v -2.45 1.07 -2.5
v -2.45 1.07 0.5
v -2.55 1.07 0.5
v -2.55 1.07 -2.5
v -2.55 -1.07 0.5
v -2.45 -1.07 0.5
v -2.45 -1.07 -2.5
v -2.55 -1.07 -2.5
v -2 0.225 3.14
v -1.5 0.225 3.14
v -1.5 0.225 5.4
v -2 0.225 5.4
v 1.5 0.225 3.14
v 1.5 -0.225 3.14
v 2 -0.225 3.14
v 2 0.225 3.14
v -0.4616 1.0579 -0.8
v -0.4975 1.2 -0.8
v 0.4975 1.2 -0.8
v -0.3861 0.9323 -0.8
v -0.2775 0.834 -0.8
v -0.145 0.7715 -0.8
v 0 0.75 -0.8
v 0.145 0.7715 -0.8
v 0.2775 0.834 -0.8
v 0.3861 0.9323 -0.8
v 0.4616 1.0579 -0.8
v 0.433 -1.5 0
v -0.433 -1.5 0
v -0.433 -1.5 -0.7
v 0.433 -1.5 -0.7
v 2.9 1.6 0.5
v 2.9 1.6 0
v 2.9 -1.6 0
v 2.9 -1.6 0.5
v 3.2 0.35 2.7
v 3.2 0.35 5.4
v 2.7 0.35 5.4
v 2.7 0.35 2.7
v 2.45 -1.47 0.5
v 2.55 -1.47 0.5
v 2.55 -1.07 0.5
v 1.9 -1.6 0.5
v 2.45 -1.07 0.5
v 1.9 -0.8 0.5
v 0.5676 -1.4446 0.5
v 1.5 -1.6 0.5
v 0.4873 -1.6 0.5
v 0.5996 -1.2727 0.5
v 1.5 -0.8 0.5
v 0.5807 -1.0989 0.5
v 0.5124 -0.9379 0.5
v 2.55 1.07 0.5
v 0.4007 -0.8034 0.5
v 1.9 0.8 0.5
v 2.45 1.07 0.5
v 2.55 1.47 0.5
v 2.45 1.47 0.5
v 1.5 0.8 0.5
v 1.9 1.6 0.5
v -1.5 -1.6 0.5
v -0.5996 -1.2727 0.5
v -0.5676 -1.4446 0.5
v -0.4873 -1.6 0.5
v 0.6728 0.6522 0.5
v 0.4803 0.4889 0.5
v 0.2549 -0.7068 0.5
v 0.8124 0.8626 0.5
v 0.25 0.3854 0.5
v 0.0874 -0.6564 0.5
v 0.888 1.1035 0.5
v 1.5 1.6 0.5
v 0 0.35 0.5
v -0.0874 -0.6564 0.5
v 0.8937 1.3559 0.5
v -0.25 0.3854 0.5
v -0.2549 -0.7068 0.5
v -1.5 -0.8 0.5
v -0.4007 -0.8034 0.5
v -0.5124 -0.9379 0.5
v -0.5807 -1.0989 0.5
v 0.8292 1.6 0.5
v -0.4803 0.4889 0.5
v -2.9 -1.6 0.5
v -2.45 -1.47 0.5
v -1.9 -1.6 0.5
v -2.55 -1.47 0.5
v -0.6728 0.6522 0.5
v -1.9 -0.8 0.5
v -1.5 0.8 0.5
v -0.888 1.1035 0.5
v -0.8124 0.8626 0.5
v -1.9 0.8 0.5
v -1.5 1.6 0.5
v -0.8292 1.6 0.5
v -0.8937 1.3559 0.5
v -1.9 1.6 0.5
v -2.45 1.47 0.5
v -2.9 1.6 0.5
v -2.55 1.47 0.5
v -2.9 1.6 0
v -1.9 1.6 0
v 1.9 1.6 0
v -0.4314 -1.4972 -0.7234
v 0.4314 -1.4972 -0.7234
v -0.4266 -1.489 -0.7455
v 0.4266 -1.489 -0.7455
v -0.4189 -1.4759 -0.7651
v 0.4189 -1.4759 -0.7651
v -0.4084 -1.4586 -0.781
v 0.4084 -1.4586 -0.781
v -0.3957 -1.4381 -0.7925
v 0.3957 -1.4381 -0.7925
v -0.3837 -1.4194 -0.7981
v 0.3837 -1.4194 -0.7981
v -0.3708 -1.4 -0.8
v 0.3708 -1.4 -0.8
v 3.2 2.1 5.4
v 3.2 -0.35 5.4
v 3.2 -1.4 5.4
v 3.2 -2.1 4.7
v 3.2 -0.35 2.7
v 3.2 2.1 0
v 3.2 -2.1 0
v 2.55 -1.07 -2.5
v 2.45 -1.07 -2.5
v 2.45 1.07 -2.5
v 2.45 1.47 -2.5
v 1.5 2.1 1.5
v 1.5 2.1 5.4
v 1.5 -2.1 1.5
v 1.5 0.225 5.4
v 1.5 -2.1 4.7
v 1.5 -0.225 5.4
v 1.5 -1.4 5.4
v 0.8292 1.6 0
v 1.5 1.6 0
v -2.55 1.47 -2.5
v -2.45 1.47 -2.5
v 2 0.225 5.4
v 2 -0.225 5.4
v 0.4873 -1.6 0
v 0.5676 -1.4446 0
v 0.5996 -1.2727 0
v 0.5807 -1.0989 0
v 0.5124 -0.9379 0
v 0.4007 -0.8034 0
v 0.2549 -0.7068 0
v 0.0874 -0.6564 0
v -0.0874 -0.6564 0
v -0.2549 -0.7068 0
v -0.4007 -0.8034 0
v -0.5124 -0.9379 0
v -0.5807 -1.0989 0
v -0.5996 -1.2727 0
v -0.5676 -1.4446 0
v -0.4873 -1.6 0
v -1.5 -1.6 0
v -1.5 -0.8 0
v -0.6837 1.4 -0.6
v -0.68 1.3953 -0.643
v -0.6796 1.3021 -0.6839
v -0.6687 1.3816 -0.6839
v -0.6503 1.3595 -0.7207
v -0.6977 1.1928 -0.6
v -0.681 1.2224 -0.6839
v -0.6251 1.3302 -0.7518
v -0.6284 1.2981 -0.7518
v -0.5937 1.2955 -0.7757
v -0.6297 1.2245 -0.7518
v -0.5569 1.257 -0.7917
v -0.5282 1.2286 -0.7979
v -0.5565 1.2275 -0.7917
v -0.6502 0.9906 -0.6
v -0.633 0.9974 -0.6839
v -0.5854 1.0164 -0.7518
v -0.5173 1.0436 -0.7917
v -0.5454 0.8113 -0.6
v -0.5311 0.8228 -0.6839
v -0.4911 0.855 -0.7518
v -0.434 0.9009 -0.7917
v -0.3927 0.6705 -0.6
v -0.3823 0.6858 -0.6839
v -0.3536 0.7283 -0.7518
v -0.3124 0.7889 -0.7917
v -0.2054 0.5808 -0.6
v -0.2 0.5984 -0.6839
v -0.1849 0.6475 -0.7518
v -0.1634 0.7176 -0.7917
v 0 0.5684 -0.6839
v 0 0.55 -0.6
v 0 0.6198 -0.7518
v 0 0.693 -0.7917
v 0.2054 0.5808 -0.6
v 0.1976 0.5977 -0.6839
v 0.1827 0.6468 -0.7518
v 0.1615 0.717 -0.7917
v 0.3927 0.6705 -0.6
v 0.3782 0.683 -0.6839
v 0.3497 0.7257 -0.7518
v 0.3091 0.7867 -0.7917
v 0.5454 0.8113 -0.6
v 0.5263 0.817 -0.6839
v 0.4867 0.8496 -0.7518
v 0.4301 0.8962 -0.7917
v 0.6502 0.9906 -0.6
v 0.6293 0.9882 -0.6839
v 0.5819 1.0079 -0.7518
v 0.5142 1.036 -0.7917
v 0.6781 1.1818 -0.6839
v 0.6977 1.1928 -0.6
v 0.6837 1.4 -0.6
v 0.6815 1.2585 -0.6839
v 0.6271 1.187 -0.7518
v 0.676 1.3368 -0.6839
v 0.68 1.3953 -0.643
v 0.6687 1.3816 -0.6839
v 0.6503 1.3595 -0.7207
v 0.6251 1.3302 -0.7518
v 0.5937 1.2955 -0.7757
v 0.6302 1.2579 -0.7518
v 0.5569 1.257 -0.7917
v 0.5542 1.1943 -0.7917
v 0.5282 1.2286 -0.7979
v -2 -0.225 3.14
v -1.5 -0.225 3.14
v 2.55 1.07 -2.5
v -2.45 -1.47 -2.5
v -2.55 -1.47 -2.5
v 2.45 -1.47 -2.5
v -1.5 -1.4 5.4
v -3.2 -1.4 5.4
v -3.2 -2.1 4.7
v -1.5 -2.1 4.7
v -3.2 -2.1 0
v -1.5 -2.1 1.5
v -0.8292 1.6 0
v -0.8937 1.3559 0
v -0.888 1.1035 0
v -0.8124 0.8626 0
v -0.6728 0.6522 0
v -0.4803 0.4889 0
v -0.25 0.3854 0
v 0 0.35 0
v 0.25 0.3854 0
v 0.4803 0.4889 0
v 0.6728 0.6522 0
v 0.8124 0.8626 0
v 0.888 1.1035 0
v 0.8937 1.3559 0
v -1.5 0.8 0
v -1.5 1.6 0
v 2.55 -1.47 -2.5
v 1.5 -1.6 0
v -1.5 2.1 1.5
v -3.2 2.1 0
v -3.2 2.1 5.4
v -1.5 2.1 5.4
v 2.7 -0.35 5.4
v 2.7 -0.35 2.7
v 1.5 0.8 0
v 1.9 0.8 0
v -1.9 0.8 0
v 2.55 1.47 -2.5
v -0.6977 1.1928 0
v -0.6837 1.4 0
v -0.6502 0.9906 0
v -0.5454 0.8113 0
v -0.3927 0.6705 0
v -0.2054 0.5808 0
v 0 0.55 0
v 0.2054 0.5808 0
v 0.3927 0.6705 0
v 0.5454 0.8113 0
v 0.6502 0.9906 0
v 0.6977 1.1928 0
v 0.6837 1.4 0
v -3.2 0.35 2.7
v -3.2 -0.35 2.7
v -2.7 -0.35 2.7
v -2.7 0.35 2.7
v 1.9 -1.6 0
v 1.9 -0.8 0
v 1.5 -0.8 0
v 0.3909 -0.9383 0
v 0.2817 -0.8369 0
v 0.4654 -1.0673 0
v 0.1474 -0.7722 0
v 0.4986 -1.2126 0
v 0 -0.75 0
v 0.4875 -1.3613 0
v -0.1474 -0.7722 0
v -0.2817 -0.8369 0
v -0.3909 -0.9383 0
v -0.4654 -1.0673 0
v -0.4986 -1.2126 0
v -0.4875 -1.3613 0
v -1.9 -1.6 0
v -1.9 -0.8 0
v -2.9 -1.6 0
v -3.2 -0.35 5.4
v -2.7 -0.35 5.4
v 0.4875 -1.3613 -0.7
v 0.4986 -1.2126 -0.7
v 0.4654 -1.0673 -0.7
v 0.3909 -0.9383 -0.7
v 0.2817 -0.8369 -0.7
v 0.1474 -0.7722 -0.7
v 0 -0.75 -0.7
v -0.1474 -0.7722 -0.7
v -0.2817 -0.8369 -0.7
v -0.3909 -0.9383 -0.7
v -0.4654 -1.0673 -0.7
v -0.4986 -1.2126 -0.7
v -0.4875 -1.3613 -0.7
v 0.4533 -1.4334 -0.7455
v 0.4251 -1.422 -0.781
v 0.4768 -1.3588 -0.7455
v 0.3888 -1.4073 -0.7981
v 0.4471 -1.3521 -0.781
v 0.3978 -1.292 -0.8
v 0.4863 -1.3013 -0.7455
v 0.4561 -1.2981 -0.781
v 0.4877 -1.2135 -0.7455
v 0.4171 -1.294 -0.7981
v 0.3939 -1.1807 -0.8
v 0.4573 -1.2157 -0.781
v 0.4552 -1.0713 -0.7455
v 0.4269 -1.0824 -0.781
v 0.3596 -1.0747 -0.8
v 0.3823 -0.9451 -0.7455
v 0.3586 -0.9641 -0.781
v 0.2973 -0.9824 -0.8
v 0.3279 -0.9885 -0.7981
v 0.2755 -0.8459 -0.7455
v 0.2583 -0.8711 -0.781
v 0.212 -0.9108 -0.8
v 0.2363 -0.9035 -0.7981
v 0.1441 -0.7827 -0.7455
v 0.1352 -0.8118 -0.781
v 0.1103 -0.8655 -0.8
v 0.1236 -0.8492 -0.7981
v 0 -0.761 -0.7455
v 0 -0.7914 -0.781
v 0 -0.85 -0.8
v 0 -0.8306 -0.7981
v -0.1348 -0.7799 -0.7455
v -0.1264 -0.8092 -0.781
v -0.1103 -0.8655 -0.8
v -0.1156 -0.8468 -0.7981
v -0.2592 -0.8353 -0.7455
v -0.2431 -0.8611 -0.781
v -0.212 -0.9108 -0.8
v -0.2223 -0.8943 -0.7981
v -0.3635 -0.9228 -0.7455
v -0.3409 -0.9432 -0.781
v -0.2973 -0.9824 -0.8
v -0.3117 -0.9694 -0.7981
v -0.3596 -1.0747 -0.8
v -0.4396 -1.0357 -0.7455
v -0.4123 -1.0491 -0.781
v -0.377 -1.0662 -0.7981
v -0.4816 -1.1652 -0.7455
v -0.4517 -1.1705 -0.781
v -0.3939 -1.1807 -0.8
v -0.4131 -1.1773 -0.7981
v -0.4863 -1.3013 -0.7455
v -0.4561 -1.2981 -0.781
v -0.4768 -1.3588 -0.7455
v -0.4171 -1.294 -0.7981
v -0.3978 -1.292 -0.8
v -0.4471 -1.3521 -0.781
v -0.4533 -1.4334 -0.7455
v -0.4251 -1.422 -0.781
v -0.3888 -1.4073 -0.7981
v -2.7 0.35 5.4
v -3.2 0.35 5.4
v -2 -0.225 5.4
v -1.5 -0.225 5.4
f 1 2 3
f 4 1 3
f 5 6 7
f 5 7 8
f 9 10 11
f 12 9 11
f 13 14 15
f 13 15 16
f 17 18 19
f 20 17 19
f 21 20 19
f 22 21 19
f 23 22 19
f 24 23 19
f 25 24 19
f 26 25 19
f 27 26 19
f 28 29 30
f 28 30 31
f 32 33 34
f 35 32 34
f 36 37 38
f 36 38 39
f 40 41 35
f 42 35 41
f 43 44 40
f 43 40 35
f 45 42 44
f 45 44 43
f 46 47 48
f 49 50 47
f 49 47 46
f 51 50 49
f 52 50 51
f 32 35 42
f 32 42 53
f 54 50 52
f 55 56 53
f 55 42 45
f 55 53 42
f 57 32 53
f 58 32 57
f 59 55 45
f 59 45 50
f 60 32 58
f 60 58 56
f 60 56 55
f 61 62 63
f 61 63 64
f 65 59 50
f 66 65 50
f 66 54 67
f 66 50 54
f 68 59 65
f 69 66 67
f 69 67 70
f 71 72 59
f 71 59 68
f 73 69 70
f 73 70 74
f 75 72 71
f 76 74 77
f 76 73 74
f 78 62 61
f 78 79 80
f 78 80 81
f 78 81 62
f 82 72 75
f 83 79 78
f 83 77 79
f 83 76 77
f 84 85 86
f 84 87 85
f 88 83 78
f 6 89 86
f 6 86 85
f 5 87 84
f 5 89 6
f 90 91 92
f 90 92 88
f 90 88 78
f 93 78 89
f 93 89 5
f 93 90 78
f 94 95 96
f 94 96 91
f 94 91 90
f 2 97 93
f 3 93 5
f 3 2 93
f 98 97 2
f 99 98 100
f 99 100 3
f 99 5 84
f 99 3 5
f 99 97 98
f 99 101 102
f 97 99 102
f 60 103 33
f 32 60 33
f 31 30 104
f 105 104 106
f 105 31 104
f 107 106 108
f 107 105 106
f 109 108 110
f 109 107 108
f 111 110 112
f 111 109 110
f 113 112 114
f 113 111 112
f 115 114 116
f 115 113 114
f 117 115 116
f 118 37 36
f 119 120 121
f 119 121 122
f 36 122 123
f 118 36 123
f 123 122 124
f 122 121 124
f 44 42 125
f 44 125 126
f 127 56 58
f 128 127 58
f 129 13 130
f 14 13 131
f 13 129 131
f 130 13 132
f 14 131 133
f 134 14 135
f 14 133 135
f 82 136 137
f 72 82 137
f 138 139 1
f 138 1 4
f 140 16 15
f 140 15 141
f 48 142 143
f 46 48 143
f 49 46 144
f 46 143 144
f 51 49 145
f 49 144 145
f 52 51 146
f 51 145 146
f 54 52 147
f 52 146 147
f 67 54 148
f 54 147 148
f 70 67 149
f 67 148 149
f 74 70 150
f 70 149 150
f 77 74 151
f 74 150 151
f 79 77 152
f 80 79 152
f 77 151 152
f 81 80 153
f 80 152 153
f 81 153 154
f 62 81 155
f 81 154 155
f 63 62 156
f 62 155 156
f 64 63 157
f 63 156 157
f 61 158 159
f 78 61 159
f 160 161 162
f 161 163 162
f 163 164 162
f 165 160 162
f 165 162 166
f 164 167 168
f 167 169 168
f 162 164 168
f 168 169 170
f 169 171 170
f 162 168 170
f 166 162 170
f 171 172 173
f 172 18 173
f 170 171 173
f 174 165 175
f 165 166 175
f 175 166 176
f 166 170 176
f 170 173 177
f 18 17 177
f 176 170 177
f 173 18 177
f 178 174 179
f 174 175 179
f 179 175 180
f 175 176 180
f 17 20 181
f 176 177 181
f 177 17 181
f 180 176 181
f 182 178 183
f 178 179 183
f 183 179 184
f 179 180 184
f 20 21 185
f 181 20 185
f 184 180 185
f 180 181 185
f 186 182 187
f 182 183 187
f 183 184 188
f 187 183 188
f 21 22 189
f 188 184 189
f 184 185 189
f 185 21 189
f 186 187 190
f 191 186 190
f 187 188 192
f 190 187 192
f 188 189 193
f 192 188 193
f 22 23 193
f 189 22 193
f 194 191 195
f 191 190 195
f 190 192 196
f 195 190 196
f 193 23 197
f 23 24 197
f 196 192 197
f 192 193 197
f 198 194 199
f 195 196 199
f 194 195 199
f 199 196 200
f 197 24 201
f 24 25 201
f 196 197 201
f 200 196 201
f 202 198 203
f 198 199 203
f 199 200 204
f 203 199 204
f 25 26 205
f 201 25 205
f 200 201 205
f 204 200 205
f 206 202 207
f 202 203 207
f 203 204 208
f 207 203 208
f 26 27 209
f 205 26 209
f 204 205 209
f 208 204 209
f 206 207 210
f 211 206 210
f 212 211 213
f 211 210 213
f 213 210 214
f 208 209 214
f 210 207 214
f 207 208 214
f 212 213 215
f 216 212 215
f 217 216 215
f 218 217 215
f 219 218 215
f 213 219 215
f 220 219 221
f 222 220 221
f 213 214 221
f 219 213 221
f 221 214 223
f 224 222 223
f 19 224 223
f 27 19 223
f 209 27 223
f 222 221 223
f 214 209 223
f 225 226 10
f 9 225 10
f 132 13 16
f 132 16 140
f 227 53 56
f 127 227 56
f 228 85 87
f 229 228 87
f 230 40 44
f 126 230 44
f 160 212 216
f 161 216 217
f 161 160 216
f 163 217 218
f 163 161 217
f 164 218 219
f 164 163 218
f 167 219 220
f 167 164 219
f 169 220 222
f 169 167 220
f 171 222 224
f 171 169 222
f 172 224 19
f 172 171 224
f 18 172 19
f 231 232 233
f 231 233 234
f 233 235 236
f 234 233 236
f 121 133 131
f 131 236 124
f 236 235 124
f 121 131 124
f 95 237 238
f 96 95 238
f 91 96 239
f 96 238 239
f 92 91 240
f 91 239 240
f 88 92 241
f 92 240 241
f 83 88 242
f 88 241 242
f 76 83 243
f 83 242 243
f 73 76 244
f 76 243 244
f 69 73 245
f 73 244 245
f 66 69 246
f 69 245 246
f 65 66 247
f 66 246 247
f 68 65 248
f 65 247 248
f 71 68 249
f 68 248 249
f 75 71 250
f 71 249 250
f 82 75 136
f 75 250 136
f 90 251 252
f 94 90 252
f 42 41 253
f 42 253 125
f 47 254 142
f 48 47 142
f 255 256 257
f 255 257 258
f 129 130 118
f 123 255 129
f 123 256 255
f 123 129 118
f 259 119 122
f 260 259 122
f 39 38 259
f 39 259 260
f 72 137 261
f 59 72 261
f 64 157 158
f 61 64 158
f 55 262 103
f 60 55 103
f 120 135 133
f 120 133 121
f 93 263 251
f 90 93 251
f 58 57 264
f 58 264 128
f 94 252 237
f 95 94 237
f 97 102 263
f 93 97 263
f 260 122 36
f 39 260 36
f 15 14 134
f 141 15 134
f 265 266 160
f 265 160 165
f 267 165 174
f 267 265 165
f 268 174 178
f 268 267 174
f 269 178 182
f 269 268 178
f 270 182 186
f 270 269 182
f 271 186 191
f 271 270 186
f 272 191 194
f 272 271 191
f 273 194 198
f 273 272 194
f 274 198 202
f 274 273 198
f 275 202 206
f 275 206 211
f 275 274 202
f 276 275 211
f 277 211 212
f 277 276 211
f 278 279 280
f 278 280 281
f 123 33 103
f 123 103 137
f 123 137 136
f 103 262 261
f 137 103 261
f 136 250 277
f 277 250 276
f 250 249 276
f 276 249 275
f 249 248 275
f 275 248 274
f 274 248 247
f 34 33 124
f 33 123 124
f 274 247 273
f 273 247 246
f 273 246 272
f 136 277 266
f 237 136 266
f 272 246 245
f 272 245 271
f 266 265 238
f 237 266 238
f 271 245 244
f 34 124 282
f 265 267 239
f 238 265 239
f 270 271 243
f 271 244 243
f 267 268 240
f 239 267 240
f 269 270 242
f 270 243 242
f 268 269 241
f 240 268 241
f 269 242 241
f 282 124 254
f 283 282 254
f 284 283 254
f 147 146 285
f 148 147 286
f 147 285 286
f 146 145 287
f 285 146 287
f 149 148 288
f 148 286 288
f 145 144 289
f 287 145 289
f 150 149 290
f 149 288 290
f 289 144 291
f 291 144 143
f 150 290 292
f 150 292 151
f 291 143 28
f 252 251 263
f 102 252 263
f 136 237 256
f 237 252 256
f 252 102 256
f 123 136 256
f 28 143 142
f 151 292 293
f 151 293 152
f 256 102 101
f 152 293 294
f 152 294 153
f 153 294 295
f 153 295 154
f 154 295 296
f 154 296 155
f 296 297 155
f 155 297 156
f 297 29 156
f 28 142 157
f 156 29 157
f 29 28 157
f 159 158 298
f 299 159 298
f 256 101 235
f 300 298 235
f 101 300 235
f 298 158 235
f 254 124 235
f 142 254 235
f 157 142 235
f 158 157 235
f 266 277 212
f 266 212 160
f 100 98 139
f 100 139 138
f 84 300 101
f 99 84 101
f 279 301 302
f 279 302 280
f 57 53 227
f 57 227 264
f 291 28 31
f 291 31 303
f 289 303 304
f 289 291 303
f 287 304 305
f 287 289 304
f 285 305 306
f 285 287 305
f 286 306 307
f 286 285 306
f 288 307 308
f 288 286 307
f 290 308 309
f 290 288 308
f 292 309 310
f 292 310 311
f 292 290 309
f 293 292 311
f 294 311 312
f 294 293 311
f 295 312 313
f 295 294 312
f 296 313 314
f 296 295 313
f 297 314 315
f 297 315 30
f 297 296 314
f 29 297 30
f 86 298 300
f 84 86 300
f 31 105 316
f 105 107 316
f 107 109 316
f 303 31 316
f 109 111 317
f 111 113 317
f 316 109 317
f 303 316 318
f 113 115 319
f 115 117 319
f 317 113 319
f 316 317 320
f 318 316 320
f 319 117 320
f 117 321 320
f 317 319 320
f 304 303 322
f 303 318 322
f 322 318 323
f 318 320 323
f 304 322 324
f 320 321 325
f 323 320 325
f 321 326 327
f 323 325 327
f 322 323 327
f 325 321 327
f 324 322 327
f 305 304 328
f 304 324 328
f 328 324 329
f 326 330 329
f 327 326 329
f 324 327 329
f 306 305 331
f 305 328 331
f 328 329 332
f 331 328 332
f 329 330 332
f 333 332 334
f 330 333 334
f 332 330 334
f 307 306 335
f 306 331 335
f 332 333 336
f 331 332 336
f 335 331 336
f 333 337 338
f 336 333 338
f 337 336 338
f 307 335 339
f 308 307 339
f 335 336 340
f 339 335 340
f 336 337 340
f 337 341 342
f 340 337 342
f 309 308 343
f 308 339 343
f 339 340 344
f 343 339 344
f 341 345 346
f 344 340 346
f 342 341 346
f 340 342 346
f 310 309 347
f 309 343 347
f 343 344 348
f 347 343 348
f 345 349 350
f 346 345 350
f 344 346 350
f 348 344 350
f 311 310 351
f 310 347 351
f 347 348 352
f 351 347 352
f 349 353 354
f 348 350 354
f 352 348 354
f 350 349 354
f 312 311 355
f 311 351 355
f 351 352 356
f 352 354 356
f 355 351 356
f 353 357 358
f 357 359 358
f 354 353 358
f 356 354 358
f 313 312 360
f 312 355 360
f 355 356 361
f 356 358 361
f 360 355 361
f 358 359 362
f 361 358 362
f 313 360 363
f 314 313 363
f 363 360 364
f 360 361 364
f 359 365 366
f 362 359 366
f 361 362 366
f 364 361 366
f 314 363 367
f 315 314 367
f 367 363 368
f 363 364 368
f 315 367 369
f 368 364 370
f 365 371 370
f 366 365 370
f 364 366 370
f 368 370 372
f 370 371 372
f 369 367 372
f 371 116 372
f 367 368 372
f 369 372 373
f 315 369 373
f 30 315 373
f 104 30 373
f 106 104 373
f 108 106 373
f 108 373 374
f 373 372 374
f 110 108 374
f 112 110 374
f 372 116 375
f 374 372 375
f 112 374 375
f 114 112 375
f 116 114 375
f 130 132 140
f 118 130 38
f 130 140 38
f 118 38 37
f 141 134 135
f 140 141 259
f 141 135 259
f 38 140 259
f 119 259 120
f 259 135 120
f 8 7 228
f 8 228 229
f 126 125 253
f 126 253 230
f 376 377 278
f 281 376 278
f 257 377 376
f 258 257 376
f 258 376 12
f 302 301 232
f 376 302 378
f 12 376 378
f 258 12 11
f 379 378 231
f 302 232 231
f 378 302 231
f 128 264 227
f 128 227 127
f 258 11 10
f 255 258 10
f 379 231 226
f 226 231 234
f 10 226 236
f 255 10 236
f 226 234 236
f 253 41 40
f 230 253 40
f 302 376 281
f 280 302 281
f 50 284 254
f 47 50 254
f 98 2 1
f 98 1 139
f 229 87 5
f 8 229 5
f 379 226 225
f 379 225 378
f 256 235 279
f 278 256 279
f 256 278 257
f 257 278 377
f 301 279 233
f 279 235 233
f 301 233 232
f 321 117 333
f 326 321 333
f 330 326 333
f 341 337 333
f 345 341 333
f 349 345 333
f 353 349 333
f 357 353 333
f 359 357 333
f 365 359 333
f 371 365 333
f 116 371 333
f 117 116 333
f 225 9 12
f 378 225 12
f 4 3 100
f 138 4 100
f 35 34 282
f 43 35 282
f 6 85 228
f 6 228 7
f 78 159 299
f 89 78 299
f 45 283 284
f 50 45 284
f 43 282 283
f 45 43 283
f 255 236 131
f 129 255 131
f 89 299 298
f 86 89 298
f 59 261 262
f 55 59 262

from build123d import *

# Parameters (mm, degrees)
EXTRUDE_1_DEPTH      = 2.1
EXTRUDE_1_DEPTH_BACK = 2.1
SKETCH_3_W           = 2.7
SKETCH_3_H           = 0.7
CUT_EXTRUDE_1_DEPTH  = 0.5
SKETCH_4_W           = 2.26
SKETCH_4_H           = 0.45
CUT_EXTRUDE_2_DEPTH  = 0.5
CHAMFER_1_SIZE       = 0.7
CUT_EXTRUDE_3_DEPTH  = 0.5
EXTRUDE_3_DEPTH      = 0.8
FILLET_1_R           = 0.2
FILLET_2_R           = 0.1
SKETCH_2_W           = 0.1
SKETCH_2_H           = 0.4
EXTRUDE_2_DEPTH      = 3


with BuildPart() as part:
    # Эскиз1 → Бобышка-Вытянуть1 (new, two sides: drawn at the far end of the back side and taken through both)
    with BuildSketch(Plane(origin=(0, 0, 0), x_dir=(1, 0, 0), z_dir=(0, 1, 0)).offset(-EXTRUDE_1_DEPTH_BACK)):
        Polygon((3.2, 0), (-3.2, 0), (-3.2, -5.4), (-1.5, -5.4), (-1.5, -1.5), (1.5, -1.5), (1.5, -5.4), (3.2, -5.4), align=None)
    extrude(amount=EXTRUDE_1_DEPTH + EXTRUDE_1_DEPTH_BACK)

    # Эскиз3 → Вырез-Вытянуть1 (cut)
    with BuildSketch(Plane(origin=(3.2, 0, 0), x_dir=(0, 0, -1), z_dir=(1, 0, 0))):
        with Locations((-4.05, 0)):
            Rectangle(SKETCH_3_W, SKETCH_3_H)
    cut_extrude_1 = extrude(amount=-CUT_EXTRUDE_1_DEPTH, mode=Mode.SUBTRACT)

    # Эскиз4 → Вырез-Вытянуть2 (cut)
    with BuildSketch(Plane.ZY.offset(-1.5)):
        with Locations((4.27, 0)):
            Rectangle(SKETCH_4_W, SKETCH_4_H)
    cut_extrude_2 = extrude(amount=-CUT_EXTRUDE_2_DEPTH, mode=Mode.SUBTRACT)

    # Зеркальное отражение1: Вырез-Вытянуть1, Вырез-Вытянуть2 across plane
    add(cut_extrude_1.mirror(Plane(origin=(0, 0, 0), x_dir=(0, 0, 1), z_dir=(1, 0, 0))), mode=Mode.SUBTRACT)
    add(cut_extrude_2.mirror(Plane(origin=(0, 0, 0), x_dir=(0, 0, 1), z_dir=(1, 0, 0))), mode=Mode.SUBTRACT)

    # Фаска1
    chamfer_1_edges = [part.edges().sort_by_distance(p)[0] for p in [
        (-2.35, -2.1, 5.4),
        (2.35, -2.1, 5.4),
    ]]
    chamfer(chamfer_1_edges, length=CHAMFER_1_SIZE)

    # Эскиз6 → Вырез-Вытянуть3 (cut)
    with BuildSketch(Plane(origin=(0, 0, 0), x_dir=(-1, 0, 0), z_dir=(0, 0, -1))):
        with BuildLine():
            Line((2.9, -1.6), (2.9, 1.6))
            Line((2.9, 1.6), (1.9, 1.6))
            Line((1.9, 1.6), (1.9, 0.8))
            Line((1.9, 0.8), (1.5, 0.8))
            Line((1.5, 0.8), (1.5, 1.6))
            Line((1.5, 1.6), (0.829156198, 1.6))
            ThreePointArc((0.829156198, 1.6), (0, 0.35), (-0.829156198, 1.6))
            Line((-0.829156198, 1.6), (-1.5, 1.6))
            Line((-1.5, 1.6), (-1.5, 0.8))
            Line((-1.5, 0.8), (-1.9, 0.8))
            Line((-1.9, 0.8), (-1.9, 1.6))
            Line((-1.9, 1.6), (-2.9, 1.6))
            Line((-2.9, 1.6), (-2.9, -1.6))
            Line((-2.9, -1.6), (-1.9, -1.6))
            Line((-1.9, -1.6), (-1.9, -0.8))
            Line((-1.9, -0.8), (-1.5, -0.8))
            Line((-1.5, -0.8), (-1.5, -1.6))
            Line((-1.5, -1.6), (-0.487339717, -1.6))
            ThreePointArc((-0.487339717, -1.6), (0, -0.65), (0.487339717, -1.6))
            Line((0.487339717, -1.6), (1.5, -1.6))
            Line((1.5, -1.6), (1.5, -0.8))
            Line((1.5, -0.8), (1.9, -0.8))
            Line((1.9, -0.8), (1.9, -1.6))
            Line((1.9, -1.6), (2.9, -1.6))
        make_face()
    extrude(amount=-CUT_EXTRUDE_3_DEPTH, mode=Mode.SUBTRACT)

    # Эскиз5 → Бобышка-Вытянуть3 (add)
    with BuildSketch(Plane(origin=(0, 0, 0), x_dir=(-1, 0, 0), z_dir=(0, 0, -1))):
        with BuildLine():
            Line((0.433012702, -1.5), (-0.433012702, -1.5))
            ThreePointArc((-0.433012702, -1.5), (0, -0.75), (0.433012702, -1.5))
        make_face()
        with BuildLine():
            Line((-0.683739717, 1.4), (0.683739717, 1.4))
            ThreePointArc((0.683739717, 1.4), (0, 0.55), (-0.683739717, 1.4))
        make_face()
    extrude(amount=EXTRUDE_3_DEPTH)

    # Скругление1
    fillet_1_edges = [part.edges().sort_by_distance(p)[0] for p in [
        (0, 0.55, -0.8),
        (0, 1.4, -0.8),
    ]]
    fillet(fillet_1_edges, radius=FILLET_1_R)

    # Скругление2
    fillet_2_edges = [part.edges().sort_by_distance(p)[0] for p in [
        (0, -0.75, -0.8),
        (0, -1.5, -0.8),
    ]]
    fillet(fillet_2_edges, radius=FILLET_2_R)

    # Эскиз2 → Бобышка-Вытянуть2 (add)
    with BuildSketch(Plane(origin=(0, 0, 0.5), x_dir=(-1, 0, 0), z_dir=(0, 0, -1))):
        with Locations((-2.5, 1.27)):
            Rectangle(SKETCH_2_W, SKETCH_2_H)
        with Locations((-2.5, -1.27)):
            Rectangle(SKETCH_2_W, SKETCH_2_H)
        with Locations((2.5, -1.27)):
            Rectangle(SKETCH_2_W, SKETCH_2_H)
        with Locations((2.5, 1.27)):
            Rectangle(SKETCH_2_W, SKETCH_2_H)
    extrude(amount=EXTRUDE_2_DEPTH)


solid = part.part
